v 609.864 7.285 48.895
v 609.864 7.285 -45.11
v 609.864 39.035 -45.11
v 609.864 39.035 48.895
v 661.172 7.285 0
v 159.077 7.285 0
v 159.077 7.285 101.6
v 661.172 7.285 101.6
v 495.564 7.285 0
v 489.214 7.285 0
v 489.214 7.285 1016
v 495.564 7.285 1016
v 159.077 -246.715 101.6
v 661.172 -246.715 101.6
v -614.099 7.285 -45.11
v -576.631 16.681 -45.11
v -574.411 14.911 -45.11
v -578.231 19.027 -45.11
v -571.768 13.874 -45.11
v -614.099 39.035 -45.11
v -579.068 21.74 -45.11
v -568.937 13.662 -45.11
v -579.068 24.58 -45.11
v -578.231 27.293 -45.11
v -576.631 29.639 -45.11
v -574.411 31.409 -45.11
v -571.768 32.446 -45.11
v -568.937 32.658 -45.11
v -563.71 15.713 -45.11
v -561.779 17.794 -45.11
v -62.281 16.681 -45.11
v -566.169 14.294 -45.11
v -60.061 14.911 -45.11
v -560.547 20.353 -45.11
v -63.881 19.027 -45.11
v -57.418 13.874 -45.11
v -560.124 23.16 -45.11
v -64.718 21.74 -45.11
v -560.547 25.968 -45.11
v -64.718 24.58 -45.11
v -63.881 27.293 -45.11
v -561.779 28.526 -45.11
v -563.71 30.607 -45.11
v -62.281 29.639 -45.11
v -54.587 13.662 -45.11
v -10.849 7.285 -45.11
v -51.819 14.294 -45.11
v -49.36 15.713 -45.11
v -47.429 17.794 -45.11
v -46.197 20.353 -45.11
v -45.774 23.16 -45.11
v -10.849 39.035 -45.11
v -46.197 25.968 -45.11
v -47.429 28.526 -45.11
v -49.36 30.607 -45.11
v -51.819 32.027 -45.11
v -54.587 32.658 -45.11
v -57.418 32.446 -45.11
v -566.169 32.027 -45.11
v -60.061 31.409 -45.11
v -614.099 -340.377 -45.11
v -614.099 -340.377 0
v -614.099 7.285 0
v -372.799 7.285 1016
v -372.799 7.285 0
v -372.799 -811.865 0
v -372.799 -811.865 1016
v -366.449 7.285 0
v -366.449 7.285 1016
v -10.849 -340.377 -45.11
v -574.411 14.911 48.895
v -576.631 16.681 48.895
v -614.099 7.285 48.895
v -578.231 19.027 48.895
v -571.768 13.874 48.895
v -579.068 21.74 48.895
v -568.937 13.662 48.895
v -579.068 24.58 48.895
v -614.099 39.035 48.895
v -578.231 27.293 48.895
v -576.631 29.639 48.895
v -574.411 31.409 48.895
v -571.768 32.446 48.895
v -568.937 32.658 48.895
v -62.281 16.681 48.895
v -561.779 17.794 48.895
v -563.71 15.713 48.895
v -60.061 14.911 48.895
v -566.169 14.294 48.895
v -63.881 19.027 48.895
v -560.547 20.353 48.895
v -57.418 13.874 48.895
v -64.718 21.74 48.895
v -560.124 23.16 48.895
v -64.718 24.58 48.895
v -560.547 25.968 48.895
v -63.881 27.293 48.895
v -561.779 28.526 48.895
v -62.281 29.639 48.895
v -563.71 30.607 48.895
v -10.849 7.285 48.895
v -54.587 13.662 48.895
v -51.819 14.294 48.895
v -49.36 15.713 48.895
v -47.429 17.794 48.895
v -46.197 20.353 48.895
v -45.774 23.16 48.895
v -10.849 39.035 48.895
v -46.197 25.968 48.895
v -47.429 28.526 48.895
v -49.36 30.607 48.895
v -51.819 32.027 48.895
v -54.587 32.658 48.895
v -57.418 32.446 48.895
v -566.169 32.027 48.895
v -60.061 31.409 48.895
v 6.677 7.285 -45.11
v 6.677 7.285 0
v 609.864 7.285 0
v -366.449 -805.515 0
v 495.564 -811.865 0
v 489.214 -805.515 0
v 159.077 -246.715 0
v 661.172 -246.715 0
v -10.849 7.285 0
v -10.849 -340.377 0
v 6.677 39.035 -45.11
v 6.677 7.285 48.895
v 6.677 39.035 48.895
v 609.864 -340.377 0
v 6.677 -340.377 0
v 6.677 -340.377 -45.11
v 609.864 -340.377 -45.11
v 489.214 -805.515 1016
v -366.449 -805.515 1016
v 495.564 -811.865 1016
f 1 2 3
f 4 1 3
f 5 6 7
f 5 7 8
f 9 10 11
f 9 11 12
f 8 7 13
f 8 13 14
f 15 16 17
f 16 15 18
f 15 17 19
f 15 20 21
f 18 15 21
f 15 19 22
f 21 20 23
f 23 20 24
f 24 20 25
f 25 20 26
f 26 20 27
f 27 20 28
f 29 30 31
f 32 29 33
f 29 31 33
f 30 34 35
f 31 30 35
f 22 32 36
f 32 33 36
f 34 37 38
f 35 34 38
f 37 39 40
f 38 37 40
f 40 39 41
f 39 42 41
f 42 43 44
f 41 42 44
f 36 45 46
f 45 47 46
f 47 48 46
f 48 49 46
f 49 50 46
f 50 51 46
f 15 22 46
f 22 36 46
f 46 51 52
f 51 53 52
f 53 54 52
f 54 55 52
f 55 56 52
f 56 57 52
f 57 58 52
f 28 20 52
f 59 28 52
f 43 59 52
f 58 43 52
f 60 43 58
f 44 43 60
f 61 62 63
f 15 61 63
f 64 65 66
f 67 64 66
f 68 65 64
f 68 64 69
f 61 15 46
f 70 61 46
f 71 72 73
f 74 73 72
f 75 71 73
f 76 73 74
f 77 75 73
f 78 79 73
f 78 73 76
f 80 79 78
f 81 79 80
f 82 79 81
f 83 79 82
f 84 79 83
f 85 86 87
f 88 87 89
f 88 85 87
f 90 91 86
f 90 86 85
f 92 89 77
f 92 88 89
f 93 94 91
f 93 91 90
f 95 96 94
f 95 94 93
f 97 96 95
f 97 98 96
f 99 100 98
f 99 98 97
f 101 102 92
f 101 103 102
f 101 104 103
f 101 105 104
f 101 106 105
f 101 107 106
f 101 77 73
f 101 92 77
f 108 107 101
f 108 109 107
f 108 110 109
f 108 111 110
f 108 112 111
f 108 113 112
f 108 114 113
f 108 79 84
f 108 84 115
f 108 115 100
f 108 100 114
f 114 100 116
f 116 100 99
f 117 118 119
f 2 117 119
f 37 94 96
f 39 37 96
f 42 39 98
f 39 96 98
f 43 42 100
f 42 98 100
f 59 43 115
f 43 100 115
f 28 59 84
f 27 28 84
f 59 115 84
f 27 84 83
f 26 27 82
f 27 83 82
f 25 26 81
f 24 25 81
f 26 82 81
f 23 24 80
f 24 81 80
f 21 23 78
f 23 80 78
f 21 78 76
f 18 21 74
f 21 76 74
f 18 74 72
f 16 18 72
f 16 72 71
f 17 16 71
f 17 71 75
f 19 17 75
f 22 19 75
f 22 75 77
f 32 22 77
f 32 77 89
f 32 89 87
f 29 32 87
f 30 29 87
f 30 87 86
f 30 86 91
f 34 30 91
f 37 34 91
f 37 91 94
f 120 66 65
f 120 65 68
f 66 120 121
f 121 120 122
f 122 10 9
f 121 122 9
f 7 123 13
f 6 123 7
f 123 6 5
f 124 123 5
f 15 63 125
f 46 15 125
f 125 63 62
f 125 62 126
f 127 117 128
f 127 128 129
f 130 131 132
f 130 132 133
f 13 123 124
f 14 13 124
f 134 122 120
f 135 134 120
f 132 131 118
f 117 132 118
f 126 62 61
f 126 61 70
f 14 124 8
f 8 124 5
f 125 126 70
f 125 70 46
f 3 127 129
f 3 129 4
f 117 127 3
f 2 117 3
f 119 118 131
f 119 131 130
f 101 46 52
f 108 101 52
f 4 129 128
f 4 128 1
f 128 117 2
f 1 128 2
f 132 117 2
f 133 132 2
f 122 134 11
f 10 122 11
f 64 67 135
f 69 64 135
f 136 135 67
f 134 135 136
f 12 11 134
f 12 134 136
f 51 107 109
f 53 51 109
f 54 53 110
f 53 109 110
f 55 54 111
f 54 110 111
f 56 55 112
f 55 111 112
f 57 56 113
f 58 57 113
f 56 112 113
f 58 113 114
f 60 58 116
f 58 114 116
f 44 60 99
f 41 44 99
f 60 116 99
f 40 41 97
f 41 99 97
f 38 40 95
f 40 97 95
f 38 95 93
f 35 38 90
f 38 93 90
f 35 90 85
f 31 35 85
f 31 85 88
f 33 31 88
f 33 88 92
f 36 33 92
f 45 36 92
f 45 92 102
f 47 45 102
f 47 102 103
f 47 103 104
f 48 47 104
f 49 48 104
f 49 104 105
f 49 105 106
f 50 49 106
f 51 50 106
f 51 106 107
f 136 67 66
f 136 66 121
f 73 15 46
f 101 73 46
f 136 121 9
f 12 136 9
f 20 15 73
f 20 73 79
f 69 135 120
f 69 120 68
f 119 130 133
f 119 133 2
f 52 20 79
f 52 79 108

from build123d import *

# Parameters (mm, degrees)
F0_W      = 1223.9625
F0_H      = 347.6625
F1_DEPTH  = 45.1104
F3_W      = 1223.9625
F3_H      = 31.75
F4_DEPTH  = 94.0054
F5_W      = 17.526
F5_H      = 379.4125
F6_DEPTH  = 94.0064
F7_W      = 6.35
F7_H      = 812.8
F7_H_2    = 6.35
F7_W_2    = 855.6625
F8_DEPTH  = 1016
F9_W      = 502.0945
F9_H      = 254
F10_DEPTH = 101.6
F11_R     = 9.525
F12_DEPTH = 94.0064


with BuildPart() as f1:
    # F0 (on Top) → F1 (new body)
    with BuildSketch(Plane.XY):
        with Locations((-2.1177232265, -166.5461386074)):
            Rectangle(F0_W, F0_H)
    extrude(amount=-F1_DEPTH)


with BuildPart() as f4:
    # F3 (on offset) → F4 (new body)
    with BuildSketch(Plane.XY.offset(-45.1104)):
        with Locations((-2.1177232265, 23.1601113926)):
            Rectangle(F3_W, F3_H)
    extrude(amount=F4_DEPTH)


with BuildPart() as f6_tool:
    # F5 (on face) → F6 (new body, through all)
    with BuildSketch(Plane.XY.offset(48.895)):
        with Locations((-2.0859732265, -150.6711386074)):
            Rectangle(F5_W, F5_H)
    extrude(amount=-F6_DEPTH)


with BuildPart() as f1_1:
    add(f1.part)

    # F6: cut by f6_tool
    add(f6_tool.part, mode=Mode.SUBTRACT)


with BuildPart() as f4_1:
    add(f4.part)

    # F6: cut by f6_tool
    add(f6_tool.part, mode=Mode.SUBTRACT)

    # F11 (on face) → F12 (cut, through all)
    with BuildSketch(Plane.XY.offset(48.895)):
        with Locations((-569.6489732265, 23.1601113926)):
            Circle(F11_R)
        with Locations((-55.2989732265, 23.1601113926)):
            Circle(F11_R)
    extrude(amount=-F12_DEPTH, mode=Mode.SUBTRACT)


with BuildPart() as f8:
    # F7 (on face) → F8 (new body)
    with BuildSketch(Plane.XY):
        with Locations((-369.6239732265, -399.1148886074)):
            Rectangle(F7_W, F7_H)
        with Locations((-369.6239732265, -808.6898886074)):
            Rectangle(F7_W, F7_H_2)
        with Locations((61.3822767735, -808.6898886074)):
            Rectangle(F7_W_2, F7_H_2)
        with Locations((492.3885267735, -808.6898886074)):
            Rectangle(F7_W, F7_H_2)
        with Locations((492.3885267735, -399.1148886074)):
            Rectangle(F7_W, F7_H)
    extrude(amount=F8_DEPTH)


with BuildPart() as f10:
    # F9 (on face) → F10 (new body)
    with BuildSketch(Plane.XY):
        with Locations((410.1242767735, -119.7148886074)):
            Rectangle(F9_W, F9_H)
    extrude(amount=F10_DEPTH)


solid = Compound([f1_1.part, f4_1.part, f8.part, f10.part])
